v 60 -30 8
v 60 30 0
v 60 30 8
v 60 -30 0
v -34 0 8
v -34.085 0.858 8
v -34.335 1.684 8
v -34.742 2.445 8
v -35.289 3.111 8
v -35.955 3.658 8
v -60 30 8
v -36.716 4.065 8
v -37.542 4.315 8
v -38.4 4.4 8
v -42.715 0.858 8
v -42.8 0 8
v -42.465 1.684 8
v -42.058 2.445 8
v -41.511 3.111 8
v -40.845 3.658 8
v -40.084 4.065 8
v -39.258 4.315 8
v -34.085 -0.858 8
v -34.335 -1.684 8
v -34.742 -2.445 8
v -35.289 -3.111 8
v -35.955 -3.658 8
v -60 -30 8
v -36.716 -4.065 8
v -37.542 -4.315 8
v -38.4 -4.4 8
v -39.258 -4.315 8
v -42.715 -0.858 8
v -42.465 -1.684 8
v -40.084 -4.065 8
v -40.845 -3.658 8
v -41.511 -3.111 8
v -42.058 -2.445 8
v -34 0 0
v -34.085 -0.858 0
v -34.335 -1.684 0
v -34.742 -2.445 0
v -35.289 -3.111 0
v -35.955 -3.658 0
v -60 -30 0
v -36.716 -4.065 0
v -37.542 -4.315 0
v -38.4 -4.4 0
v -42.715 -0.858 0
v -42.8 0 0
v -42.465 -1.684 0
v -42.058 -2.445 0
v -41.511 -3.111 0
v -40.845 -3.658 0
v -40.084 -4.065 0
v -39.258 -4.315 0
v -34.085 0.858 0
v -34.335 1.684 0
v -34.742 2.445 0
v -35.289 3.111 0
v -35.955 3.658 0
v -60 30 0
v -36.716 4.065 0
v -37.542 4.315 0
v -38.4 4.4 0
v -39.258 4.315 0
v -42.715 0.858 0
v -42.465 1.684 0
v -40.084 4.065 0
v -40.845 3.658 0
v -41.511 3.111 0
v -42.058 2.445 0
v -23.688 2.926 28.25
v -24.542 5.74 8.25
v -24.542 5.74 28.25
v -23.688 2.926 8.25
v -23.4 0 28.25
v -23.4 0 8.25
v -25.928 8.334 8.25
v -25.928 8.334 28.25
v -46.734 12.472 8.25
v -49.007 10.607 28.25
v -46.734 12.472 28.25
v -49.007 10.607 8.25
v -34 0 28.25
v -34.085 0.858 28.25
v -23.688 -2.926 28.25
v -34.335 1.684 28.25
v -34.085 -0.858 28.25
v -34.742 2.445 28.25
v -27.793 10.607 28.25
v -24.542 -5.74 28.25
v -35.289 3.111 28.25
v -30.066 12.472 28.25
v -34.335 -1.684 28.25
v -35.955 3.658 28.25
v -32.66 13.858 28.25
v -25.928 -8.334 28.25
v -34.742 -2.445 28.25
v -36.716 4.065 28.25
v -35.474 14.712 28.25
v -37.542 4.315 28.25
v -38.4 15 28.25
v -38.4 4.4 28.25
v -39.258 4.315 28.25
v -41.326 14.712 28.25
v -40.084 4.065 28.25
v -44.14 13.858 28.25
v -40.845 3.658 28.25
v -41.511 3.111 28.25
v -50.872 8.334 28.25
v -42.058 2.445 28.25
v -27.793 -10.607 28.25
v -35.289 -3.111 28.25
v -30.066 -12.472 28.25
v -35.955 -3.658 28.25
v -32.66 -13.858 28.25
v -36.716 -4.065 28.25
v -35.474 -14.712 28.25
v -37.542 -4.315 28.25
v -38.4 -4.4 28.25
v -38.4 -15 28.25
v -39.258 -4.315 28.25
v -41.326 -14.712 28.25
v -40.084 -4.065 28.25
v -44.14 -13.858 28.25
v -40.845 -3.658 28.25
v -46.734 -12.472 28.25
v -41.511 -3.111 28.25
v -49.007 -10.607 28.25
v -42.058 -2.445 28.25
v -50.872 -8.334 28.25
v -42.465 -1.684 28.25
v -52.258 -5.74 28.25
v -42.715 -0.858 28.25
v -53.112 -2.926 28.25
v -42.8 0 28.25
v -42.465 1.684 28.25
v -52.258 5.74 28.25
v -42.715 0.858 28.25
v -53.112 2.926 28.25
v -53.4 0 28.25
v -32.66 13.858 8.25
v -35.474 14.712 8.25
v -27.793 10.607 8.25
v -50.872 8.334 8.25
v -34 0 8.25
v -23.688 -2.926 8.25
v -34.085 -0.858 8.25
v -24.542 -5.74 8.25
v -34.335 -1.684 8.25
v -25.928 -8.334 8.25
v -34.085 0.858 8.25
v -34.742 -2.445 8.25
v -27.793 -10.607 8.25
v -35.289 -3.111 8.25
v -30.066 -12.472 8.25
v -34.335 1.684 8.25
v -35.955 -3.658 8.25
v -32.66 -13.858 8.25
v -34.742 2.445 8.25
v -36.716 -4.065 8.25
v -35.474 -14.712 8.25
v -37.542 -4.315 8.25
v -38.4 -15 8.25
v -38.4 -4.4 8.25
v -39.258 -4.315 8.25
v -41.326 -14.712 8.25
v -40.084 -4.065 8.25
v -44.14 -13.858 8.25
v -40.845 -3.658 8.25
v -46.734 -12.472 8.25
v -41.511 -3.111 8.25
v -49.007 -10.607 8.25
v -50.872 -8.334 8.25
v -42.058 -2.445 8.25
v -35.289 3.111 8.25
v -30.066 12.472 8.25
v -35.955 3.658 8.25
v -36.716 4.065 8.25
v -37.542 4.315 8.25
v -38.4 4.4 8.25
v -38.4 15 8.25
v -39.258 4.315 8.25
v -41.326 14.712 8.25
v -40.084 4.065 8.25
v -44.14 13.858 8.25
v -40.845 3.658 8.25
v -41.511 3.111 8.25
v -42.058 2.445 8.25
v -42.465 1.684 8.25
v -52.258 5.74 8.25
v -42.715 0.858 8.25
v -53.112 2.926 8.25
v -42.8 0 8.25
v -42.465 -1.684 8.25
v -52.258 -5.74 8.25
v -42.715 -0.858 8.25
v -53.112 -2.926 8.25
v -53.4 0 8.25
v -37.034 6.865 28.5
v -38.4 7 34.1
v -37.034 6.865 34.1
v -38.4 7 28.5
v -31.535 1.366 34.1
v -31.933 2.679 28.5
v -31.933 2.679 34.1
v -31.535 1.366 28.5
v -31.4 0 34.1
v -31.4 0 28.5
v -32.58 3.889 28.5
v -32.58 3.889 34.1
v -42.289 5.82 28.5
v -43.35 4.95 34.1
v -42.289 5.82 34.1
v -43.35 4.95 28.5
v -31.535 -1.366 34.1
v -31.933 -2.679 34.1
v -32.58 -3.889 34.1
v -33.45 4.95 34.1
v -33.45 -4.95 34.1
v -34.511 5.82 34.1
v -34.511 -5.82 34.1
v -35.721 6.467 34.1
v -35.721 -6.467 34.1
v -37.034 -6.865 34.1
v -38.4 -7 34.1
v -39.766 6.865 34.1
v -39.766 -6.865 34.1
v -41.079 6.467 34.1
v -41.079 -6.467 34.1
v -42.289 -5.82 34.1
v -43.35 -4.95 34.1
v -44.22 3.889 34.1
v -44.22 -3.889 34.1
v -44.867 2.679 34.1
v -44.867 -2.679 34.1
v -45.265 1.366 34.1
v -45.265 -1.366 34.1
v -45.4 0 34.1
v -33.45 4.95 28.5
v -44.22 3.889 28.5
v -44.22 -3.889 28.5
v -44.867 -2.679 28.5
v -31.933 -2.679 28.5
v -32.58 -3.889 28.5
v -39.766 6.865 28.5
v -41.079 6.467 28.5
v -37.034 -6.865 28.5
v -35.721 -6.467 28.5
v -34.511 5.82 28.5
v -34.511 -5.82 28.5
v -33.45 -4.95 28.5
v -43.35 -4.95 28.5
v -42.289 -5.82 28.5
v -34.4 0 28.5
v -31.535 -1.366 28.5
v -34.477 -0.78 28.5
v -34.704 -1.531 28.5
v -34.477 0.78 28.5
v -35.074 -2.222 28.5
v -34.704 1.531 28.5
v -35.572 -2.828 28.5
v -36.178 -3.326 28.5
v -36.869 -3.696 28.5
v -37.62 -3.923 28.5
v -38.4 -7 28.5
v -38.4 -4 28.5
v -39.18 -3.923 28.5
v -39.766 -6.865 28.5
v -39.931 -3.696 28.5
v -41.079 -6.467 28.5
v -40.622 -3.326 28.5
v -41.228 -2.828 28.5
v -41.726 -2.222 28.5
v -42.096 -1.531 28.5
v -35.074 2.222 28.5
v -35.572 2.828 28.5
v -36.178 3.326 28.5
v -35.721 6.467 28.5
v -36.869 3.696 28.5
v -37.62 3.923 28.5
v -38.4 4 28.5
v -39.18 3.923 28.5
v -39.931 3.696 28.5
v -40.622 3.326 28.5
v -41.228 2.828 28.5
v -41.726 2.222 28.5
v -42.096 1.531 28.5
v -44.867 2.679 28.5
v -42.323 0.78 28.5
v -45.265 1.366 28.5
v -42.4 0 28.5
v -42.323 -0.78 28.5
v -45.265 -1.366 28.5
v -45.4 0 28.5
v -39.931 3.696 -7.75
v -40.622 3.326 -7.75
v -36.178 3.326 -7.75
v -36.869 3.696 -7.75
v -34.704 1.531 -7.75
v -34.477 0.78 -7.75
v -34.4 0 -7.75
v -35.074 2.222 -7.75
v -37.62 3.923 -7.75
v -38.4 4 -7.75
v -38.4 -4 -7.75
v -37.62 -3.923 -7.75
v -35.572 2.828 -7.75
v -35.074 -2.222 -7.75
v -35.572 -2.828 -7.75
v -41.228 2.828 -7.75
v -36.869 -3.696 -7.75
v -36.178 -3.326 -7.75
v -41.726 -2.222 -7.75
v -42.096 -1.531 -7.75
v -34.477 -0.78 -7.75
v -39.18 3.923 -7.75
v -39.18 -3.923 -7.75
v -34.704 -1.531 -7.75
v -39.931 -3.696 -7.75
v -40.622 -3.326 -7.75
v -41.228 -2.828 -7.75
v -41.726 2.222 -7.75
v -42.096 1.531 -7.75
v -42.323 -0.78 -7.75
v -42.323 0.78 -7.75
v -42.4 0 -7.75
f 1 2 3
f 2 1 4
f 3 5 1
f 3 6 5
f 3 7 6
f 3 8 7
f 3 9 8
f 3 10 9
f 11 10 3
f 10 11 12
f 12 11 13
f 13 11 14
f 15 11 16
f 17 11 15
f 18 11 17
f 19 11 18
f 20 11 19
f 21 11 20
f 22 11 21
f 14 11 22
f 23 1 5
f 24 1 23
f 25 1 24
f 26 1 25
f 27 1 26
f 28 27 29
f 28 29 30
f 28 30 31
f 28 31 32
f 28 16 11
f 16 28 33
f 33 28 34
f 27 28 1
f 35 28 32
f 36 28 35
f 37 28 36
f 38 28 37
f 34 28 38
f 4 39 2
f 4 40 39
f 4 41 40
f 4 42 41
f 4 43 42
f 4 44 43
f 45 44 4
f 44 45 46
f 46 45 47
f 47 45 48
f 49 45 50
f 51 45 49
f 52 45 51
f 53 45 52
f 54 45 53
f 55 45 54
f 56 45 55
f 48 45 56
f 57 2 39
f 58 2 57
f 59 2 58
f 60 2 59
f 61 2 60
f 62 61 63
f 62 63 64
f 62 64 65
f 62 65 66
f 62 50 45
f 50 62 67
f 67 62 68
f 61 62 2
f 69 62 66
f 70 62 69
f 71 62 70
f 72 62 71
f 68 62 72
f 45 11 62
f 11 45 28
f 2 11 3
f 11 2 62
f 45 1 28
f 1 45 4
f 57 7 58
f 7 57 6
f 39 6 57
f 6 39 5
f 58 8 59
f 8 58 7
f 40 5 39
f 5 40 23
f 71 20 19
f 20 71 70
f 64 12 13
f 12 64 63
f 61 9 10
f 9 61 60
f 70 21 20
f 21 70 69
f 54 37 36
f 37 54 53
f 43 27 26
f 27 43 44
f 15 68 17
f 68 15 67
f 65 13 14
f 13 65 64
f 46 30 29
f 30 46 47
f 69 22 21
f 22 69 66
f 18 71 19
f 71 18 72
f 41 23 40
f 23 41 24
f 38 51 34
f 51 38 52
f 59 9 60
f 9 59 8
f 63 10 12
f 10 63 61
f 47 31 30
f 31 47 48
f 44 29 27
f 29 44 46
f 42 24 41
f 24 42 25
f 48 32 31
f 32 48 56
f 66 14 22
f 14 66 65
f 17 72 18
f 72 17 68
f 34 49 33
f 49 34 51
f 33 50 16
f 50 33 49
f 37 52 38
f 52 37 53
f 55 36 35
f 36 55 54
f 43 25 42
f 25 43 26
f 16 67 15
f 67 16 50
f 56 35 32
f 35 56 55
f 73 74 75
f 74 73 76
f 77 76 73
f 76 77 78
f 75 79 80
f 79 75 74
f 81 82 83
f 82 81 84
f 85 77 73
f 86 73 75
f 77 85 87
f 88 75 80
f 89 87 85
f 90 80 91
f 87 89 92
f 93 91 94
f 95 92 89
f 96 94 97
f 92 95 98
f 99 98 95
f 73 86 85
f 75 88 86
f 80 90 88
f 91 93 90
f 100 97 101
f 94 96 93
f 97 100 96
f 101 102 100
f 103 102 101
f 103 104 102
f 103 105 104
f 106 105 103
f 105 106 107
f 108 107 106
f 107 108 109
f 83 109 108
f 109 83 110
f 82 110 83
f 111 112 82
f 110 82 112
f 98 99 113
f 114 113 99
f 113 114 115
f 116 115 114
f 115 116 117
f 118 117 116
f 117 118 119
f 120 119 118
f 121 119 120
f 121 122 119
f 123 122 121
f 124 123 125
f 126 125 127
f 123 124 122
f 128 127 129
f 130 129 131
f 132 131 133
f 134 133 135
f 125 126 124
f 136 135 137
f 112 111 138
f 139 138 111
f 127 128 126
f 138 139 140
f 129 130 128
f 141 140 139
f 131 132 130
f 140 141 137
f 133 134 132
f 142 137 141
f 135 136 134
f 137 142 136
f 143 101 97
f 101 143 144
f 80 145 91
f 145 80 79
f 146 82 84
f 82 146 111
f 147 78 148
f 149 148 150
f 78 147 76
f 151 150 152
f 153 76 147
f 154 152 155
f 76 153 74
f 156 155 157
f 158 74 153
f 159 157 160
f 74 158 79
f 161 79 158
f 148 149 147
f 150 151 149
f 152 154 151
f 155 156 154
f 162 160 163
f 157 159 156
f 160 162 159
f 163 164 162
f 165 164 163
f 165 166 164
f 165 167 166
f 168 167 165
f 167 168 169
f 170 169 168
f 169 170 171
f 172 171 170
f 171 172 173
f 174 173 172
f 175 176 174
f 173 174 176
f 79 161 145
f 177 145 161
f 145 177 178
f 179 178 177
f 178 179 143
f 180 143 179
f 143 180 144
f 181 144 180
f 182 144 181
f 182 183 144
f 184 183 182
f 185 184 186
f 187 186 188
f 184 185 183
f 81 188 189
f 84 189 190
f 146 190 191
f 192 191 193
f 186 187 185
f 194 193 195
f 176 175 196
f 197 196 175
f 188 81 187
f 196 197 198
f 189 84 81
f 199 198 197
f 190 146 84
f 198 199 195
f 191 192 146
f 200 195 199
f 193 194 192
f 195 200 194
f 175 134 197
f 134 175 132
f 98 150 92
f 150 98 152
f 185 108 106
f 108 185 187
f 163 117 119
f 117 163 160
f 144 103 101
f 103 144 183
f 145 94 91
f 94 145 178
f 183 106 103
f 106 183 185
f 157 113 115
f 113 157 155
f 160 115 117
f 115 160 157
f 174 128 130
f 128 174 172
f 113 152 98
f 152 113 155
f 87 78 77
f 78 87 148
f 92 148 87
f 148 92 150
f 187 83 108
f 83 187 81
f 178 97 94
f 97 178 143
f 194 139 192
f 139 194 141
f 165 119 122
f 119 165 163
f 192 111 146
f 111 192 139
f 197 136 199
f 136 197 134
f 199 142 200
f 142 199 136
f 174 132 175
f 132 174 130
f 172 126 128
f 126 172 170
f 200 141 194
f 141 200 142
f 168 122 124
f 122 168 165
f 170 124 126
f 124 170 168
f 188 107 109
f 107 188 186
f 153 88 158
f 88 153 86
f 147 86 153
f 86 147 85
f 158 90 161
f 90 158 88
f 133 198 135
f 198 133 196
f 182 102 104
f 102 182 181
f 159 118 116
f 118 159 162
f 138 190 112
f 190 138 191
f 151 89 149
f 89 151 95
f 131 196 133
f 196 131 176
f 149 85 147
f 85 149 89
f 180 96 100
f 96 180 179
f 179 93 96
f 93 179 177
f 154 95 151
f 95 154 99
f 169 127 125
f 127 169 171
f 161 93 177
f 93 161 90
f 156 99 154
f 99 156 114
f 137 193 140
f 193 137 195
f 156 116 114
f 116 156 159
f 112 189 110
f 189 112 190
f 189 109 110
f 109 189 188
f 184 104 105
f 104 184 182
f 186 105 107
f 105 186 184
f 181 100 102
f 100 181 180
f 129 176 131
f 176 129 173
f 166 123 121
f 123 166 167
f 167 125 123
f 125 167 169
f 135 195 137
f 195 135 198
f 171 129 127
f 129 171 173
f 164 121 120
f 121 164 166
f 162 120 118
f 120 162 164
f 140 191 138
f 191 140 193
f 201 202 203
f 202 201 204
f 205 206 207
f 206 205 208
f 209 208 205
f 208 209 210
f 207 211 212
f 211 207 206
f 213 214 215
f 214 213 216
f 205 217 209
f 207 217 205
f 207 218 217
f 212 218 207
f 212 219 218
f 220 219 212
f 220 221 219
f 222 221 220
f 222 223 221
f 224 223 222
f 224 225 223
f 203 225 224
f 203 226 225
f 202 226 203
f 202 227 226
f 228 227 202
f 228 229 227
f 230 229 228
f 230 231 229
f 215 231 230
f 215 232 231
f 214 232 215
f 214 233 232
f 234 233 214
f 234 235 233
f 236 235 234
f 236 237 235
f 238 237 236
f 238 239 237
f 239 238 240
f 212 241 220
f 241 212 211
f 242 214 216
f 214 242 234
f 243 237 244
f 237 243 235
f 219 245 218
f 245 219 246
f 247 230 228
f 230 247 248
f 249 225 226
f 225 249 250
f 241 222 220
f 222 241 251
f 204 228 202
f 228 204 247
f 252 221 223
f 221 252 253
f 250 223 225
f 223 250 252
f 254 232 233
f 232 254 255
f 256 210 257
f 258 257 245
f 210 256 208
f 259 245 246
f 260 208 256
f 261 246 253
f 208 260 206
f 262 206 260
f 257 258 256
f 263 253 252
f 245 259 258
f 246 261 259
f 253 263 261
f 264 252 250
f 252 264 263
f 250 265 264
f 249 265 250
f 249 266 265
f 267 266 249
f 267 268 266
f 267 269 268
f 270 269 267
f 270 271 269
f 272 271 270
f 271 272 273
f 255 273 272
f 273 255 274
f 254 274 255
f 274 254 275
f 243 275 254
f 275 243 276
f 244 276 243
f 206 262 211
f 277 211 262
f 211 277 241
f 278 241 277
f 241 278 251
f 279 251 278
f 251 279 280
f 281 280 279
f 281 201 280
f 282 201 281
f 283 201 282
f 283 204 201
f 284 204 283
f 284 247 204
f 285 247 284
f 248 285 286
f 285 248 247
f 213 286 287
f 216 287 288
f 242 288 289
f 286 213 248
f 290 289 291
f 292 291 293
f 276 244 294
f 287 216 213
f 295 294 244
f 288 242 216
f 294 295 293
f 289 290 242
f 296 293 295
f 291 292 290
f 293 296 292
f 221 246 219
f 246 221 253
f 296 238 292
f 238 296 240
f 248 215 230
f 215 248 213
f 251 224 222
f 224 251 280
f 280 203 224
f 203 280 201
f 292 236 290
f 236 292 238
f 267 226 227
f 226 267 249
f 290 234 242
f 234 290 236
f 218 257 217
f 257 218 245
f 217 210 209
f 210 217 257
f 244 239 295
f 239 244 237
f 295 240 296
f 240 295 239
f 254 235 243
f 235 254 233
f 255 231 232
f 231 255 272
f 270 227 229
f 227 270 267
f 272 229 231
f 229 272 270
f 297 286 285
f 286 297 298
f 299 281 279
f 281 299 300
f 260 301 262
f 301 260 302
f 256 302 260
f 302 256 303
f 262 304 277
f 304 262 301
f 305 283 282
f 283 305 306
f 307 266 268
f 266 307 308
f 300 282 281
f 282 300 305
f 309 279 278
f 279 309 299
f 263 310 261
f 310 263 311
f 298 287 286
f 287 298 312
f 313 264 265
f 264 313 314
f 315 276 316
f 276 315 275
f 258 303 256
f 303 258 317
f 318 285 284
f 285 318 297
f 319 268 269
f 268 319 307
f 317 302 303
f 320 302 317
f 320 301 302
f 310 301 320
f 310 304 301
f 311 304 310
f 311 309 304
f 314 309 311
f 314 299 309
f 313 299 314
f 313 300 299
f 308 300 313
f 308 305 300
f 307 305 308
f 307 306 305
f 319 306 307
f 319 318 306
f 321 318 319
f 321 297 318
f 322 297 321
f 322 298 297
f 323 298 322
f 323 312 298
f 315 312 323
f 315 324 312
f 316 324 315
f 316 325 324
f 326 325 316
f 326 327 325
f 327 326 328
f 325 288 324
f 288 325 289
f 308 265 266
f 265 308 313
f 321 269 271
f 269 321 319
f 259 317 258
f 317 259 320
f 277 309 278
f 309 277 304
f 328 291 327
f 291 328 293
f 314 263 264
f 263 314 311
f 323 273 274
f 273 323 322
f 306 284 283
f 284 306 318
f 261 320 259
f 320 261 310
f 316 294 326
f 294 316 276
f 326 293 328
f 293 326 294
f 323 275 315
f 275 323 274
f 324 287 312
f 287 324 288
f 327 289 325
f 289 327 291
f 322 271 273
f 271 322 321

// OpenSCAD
$fn = 32;

// ------------------------------------------------------------------------
// Standoff columns: 1 d30 standoffs, bolts d8
// Every part is its own module, assembly() places them once.
// ------------------------------------------------------------------------

// --- part 1 ---
module base_plate() {
  difference() {
    translate([-60, -30, 0]) cube([120, 60, 8]);
    translate([-38.4, 0, -1]) cylinder(h = 10, d = 8.8);
  }
}

// --- part 2 ---
module spacer() {
  difference() {
      translate([0, 0, 0]) cylinder(h = 20, d = 30);
      translate([0, 0, -1]) cylinder(h = 22, d = 8.8);
    }
}

// --- part 3 ---
module bolt() {
  cylinder(h = 5.6, d = 14);
  translate([0, 0, -36.25]) cylinder(h = 36.25, d = 8);
}

// --- assembly ---
module assembly() {
  translate([0, 0, 0]) rotate([0, 0, 0]) base_plate();
  translate([-38.4, 0, 8.25]) rotate([0, 0, 0]) spacer();
  translate([-38.4, 0, 28.5]) rotate([0, 0, 0]) bolt();
}

assembly();
